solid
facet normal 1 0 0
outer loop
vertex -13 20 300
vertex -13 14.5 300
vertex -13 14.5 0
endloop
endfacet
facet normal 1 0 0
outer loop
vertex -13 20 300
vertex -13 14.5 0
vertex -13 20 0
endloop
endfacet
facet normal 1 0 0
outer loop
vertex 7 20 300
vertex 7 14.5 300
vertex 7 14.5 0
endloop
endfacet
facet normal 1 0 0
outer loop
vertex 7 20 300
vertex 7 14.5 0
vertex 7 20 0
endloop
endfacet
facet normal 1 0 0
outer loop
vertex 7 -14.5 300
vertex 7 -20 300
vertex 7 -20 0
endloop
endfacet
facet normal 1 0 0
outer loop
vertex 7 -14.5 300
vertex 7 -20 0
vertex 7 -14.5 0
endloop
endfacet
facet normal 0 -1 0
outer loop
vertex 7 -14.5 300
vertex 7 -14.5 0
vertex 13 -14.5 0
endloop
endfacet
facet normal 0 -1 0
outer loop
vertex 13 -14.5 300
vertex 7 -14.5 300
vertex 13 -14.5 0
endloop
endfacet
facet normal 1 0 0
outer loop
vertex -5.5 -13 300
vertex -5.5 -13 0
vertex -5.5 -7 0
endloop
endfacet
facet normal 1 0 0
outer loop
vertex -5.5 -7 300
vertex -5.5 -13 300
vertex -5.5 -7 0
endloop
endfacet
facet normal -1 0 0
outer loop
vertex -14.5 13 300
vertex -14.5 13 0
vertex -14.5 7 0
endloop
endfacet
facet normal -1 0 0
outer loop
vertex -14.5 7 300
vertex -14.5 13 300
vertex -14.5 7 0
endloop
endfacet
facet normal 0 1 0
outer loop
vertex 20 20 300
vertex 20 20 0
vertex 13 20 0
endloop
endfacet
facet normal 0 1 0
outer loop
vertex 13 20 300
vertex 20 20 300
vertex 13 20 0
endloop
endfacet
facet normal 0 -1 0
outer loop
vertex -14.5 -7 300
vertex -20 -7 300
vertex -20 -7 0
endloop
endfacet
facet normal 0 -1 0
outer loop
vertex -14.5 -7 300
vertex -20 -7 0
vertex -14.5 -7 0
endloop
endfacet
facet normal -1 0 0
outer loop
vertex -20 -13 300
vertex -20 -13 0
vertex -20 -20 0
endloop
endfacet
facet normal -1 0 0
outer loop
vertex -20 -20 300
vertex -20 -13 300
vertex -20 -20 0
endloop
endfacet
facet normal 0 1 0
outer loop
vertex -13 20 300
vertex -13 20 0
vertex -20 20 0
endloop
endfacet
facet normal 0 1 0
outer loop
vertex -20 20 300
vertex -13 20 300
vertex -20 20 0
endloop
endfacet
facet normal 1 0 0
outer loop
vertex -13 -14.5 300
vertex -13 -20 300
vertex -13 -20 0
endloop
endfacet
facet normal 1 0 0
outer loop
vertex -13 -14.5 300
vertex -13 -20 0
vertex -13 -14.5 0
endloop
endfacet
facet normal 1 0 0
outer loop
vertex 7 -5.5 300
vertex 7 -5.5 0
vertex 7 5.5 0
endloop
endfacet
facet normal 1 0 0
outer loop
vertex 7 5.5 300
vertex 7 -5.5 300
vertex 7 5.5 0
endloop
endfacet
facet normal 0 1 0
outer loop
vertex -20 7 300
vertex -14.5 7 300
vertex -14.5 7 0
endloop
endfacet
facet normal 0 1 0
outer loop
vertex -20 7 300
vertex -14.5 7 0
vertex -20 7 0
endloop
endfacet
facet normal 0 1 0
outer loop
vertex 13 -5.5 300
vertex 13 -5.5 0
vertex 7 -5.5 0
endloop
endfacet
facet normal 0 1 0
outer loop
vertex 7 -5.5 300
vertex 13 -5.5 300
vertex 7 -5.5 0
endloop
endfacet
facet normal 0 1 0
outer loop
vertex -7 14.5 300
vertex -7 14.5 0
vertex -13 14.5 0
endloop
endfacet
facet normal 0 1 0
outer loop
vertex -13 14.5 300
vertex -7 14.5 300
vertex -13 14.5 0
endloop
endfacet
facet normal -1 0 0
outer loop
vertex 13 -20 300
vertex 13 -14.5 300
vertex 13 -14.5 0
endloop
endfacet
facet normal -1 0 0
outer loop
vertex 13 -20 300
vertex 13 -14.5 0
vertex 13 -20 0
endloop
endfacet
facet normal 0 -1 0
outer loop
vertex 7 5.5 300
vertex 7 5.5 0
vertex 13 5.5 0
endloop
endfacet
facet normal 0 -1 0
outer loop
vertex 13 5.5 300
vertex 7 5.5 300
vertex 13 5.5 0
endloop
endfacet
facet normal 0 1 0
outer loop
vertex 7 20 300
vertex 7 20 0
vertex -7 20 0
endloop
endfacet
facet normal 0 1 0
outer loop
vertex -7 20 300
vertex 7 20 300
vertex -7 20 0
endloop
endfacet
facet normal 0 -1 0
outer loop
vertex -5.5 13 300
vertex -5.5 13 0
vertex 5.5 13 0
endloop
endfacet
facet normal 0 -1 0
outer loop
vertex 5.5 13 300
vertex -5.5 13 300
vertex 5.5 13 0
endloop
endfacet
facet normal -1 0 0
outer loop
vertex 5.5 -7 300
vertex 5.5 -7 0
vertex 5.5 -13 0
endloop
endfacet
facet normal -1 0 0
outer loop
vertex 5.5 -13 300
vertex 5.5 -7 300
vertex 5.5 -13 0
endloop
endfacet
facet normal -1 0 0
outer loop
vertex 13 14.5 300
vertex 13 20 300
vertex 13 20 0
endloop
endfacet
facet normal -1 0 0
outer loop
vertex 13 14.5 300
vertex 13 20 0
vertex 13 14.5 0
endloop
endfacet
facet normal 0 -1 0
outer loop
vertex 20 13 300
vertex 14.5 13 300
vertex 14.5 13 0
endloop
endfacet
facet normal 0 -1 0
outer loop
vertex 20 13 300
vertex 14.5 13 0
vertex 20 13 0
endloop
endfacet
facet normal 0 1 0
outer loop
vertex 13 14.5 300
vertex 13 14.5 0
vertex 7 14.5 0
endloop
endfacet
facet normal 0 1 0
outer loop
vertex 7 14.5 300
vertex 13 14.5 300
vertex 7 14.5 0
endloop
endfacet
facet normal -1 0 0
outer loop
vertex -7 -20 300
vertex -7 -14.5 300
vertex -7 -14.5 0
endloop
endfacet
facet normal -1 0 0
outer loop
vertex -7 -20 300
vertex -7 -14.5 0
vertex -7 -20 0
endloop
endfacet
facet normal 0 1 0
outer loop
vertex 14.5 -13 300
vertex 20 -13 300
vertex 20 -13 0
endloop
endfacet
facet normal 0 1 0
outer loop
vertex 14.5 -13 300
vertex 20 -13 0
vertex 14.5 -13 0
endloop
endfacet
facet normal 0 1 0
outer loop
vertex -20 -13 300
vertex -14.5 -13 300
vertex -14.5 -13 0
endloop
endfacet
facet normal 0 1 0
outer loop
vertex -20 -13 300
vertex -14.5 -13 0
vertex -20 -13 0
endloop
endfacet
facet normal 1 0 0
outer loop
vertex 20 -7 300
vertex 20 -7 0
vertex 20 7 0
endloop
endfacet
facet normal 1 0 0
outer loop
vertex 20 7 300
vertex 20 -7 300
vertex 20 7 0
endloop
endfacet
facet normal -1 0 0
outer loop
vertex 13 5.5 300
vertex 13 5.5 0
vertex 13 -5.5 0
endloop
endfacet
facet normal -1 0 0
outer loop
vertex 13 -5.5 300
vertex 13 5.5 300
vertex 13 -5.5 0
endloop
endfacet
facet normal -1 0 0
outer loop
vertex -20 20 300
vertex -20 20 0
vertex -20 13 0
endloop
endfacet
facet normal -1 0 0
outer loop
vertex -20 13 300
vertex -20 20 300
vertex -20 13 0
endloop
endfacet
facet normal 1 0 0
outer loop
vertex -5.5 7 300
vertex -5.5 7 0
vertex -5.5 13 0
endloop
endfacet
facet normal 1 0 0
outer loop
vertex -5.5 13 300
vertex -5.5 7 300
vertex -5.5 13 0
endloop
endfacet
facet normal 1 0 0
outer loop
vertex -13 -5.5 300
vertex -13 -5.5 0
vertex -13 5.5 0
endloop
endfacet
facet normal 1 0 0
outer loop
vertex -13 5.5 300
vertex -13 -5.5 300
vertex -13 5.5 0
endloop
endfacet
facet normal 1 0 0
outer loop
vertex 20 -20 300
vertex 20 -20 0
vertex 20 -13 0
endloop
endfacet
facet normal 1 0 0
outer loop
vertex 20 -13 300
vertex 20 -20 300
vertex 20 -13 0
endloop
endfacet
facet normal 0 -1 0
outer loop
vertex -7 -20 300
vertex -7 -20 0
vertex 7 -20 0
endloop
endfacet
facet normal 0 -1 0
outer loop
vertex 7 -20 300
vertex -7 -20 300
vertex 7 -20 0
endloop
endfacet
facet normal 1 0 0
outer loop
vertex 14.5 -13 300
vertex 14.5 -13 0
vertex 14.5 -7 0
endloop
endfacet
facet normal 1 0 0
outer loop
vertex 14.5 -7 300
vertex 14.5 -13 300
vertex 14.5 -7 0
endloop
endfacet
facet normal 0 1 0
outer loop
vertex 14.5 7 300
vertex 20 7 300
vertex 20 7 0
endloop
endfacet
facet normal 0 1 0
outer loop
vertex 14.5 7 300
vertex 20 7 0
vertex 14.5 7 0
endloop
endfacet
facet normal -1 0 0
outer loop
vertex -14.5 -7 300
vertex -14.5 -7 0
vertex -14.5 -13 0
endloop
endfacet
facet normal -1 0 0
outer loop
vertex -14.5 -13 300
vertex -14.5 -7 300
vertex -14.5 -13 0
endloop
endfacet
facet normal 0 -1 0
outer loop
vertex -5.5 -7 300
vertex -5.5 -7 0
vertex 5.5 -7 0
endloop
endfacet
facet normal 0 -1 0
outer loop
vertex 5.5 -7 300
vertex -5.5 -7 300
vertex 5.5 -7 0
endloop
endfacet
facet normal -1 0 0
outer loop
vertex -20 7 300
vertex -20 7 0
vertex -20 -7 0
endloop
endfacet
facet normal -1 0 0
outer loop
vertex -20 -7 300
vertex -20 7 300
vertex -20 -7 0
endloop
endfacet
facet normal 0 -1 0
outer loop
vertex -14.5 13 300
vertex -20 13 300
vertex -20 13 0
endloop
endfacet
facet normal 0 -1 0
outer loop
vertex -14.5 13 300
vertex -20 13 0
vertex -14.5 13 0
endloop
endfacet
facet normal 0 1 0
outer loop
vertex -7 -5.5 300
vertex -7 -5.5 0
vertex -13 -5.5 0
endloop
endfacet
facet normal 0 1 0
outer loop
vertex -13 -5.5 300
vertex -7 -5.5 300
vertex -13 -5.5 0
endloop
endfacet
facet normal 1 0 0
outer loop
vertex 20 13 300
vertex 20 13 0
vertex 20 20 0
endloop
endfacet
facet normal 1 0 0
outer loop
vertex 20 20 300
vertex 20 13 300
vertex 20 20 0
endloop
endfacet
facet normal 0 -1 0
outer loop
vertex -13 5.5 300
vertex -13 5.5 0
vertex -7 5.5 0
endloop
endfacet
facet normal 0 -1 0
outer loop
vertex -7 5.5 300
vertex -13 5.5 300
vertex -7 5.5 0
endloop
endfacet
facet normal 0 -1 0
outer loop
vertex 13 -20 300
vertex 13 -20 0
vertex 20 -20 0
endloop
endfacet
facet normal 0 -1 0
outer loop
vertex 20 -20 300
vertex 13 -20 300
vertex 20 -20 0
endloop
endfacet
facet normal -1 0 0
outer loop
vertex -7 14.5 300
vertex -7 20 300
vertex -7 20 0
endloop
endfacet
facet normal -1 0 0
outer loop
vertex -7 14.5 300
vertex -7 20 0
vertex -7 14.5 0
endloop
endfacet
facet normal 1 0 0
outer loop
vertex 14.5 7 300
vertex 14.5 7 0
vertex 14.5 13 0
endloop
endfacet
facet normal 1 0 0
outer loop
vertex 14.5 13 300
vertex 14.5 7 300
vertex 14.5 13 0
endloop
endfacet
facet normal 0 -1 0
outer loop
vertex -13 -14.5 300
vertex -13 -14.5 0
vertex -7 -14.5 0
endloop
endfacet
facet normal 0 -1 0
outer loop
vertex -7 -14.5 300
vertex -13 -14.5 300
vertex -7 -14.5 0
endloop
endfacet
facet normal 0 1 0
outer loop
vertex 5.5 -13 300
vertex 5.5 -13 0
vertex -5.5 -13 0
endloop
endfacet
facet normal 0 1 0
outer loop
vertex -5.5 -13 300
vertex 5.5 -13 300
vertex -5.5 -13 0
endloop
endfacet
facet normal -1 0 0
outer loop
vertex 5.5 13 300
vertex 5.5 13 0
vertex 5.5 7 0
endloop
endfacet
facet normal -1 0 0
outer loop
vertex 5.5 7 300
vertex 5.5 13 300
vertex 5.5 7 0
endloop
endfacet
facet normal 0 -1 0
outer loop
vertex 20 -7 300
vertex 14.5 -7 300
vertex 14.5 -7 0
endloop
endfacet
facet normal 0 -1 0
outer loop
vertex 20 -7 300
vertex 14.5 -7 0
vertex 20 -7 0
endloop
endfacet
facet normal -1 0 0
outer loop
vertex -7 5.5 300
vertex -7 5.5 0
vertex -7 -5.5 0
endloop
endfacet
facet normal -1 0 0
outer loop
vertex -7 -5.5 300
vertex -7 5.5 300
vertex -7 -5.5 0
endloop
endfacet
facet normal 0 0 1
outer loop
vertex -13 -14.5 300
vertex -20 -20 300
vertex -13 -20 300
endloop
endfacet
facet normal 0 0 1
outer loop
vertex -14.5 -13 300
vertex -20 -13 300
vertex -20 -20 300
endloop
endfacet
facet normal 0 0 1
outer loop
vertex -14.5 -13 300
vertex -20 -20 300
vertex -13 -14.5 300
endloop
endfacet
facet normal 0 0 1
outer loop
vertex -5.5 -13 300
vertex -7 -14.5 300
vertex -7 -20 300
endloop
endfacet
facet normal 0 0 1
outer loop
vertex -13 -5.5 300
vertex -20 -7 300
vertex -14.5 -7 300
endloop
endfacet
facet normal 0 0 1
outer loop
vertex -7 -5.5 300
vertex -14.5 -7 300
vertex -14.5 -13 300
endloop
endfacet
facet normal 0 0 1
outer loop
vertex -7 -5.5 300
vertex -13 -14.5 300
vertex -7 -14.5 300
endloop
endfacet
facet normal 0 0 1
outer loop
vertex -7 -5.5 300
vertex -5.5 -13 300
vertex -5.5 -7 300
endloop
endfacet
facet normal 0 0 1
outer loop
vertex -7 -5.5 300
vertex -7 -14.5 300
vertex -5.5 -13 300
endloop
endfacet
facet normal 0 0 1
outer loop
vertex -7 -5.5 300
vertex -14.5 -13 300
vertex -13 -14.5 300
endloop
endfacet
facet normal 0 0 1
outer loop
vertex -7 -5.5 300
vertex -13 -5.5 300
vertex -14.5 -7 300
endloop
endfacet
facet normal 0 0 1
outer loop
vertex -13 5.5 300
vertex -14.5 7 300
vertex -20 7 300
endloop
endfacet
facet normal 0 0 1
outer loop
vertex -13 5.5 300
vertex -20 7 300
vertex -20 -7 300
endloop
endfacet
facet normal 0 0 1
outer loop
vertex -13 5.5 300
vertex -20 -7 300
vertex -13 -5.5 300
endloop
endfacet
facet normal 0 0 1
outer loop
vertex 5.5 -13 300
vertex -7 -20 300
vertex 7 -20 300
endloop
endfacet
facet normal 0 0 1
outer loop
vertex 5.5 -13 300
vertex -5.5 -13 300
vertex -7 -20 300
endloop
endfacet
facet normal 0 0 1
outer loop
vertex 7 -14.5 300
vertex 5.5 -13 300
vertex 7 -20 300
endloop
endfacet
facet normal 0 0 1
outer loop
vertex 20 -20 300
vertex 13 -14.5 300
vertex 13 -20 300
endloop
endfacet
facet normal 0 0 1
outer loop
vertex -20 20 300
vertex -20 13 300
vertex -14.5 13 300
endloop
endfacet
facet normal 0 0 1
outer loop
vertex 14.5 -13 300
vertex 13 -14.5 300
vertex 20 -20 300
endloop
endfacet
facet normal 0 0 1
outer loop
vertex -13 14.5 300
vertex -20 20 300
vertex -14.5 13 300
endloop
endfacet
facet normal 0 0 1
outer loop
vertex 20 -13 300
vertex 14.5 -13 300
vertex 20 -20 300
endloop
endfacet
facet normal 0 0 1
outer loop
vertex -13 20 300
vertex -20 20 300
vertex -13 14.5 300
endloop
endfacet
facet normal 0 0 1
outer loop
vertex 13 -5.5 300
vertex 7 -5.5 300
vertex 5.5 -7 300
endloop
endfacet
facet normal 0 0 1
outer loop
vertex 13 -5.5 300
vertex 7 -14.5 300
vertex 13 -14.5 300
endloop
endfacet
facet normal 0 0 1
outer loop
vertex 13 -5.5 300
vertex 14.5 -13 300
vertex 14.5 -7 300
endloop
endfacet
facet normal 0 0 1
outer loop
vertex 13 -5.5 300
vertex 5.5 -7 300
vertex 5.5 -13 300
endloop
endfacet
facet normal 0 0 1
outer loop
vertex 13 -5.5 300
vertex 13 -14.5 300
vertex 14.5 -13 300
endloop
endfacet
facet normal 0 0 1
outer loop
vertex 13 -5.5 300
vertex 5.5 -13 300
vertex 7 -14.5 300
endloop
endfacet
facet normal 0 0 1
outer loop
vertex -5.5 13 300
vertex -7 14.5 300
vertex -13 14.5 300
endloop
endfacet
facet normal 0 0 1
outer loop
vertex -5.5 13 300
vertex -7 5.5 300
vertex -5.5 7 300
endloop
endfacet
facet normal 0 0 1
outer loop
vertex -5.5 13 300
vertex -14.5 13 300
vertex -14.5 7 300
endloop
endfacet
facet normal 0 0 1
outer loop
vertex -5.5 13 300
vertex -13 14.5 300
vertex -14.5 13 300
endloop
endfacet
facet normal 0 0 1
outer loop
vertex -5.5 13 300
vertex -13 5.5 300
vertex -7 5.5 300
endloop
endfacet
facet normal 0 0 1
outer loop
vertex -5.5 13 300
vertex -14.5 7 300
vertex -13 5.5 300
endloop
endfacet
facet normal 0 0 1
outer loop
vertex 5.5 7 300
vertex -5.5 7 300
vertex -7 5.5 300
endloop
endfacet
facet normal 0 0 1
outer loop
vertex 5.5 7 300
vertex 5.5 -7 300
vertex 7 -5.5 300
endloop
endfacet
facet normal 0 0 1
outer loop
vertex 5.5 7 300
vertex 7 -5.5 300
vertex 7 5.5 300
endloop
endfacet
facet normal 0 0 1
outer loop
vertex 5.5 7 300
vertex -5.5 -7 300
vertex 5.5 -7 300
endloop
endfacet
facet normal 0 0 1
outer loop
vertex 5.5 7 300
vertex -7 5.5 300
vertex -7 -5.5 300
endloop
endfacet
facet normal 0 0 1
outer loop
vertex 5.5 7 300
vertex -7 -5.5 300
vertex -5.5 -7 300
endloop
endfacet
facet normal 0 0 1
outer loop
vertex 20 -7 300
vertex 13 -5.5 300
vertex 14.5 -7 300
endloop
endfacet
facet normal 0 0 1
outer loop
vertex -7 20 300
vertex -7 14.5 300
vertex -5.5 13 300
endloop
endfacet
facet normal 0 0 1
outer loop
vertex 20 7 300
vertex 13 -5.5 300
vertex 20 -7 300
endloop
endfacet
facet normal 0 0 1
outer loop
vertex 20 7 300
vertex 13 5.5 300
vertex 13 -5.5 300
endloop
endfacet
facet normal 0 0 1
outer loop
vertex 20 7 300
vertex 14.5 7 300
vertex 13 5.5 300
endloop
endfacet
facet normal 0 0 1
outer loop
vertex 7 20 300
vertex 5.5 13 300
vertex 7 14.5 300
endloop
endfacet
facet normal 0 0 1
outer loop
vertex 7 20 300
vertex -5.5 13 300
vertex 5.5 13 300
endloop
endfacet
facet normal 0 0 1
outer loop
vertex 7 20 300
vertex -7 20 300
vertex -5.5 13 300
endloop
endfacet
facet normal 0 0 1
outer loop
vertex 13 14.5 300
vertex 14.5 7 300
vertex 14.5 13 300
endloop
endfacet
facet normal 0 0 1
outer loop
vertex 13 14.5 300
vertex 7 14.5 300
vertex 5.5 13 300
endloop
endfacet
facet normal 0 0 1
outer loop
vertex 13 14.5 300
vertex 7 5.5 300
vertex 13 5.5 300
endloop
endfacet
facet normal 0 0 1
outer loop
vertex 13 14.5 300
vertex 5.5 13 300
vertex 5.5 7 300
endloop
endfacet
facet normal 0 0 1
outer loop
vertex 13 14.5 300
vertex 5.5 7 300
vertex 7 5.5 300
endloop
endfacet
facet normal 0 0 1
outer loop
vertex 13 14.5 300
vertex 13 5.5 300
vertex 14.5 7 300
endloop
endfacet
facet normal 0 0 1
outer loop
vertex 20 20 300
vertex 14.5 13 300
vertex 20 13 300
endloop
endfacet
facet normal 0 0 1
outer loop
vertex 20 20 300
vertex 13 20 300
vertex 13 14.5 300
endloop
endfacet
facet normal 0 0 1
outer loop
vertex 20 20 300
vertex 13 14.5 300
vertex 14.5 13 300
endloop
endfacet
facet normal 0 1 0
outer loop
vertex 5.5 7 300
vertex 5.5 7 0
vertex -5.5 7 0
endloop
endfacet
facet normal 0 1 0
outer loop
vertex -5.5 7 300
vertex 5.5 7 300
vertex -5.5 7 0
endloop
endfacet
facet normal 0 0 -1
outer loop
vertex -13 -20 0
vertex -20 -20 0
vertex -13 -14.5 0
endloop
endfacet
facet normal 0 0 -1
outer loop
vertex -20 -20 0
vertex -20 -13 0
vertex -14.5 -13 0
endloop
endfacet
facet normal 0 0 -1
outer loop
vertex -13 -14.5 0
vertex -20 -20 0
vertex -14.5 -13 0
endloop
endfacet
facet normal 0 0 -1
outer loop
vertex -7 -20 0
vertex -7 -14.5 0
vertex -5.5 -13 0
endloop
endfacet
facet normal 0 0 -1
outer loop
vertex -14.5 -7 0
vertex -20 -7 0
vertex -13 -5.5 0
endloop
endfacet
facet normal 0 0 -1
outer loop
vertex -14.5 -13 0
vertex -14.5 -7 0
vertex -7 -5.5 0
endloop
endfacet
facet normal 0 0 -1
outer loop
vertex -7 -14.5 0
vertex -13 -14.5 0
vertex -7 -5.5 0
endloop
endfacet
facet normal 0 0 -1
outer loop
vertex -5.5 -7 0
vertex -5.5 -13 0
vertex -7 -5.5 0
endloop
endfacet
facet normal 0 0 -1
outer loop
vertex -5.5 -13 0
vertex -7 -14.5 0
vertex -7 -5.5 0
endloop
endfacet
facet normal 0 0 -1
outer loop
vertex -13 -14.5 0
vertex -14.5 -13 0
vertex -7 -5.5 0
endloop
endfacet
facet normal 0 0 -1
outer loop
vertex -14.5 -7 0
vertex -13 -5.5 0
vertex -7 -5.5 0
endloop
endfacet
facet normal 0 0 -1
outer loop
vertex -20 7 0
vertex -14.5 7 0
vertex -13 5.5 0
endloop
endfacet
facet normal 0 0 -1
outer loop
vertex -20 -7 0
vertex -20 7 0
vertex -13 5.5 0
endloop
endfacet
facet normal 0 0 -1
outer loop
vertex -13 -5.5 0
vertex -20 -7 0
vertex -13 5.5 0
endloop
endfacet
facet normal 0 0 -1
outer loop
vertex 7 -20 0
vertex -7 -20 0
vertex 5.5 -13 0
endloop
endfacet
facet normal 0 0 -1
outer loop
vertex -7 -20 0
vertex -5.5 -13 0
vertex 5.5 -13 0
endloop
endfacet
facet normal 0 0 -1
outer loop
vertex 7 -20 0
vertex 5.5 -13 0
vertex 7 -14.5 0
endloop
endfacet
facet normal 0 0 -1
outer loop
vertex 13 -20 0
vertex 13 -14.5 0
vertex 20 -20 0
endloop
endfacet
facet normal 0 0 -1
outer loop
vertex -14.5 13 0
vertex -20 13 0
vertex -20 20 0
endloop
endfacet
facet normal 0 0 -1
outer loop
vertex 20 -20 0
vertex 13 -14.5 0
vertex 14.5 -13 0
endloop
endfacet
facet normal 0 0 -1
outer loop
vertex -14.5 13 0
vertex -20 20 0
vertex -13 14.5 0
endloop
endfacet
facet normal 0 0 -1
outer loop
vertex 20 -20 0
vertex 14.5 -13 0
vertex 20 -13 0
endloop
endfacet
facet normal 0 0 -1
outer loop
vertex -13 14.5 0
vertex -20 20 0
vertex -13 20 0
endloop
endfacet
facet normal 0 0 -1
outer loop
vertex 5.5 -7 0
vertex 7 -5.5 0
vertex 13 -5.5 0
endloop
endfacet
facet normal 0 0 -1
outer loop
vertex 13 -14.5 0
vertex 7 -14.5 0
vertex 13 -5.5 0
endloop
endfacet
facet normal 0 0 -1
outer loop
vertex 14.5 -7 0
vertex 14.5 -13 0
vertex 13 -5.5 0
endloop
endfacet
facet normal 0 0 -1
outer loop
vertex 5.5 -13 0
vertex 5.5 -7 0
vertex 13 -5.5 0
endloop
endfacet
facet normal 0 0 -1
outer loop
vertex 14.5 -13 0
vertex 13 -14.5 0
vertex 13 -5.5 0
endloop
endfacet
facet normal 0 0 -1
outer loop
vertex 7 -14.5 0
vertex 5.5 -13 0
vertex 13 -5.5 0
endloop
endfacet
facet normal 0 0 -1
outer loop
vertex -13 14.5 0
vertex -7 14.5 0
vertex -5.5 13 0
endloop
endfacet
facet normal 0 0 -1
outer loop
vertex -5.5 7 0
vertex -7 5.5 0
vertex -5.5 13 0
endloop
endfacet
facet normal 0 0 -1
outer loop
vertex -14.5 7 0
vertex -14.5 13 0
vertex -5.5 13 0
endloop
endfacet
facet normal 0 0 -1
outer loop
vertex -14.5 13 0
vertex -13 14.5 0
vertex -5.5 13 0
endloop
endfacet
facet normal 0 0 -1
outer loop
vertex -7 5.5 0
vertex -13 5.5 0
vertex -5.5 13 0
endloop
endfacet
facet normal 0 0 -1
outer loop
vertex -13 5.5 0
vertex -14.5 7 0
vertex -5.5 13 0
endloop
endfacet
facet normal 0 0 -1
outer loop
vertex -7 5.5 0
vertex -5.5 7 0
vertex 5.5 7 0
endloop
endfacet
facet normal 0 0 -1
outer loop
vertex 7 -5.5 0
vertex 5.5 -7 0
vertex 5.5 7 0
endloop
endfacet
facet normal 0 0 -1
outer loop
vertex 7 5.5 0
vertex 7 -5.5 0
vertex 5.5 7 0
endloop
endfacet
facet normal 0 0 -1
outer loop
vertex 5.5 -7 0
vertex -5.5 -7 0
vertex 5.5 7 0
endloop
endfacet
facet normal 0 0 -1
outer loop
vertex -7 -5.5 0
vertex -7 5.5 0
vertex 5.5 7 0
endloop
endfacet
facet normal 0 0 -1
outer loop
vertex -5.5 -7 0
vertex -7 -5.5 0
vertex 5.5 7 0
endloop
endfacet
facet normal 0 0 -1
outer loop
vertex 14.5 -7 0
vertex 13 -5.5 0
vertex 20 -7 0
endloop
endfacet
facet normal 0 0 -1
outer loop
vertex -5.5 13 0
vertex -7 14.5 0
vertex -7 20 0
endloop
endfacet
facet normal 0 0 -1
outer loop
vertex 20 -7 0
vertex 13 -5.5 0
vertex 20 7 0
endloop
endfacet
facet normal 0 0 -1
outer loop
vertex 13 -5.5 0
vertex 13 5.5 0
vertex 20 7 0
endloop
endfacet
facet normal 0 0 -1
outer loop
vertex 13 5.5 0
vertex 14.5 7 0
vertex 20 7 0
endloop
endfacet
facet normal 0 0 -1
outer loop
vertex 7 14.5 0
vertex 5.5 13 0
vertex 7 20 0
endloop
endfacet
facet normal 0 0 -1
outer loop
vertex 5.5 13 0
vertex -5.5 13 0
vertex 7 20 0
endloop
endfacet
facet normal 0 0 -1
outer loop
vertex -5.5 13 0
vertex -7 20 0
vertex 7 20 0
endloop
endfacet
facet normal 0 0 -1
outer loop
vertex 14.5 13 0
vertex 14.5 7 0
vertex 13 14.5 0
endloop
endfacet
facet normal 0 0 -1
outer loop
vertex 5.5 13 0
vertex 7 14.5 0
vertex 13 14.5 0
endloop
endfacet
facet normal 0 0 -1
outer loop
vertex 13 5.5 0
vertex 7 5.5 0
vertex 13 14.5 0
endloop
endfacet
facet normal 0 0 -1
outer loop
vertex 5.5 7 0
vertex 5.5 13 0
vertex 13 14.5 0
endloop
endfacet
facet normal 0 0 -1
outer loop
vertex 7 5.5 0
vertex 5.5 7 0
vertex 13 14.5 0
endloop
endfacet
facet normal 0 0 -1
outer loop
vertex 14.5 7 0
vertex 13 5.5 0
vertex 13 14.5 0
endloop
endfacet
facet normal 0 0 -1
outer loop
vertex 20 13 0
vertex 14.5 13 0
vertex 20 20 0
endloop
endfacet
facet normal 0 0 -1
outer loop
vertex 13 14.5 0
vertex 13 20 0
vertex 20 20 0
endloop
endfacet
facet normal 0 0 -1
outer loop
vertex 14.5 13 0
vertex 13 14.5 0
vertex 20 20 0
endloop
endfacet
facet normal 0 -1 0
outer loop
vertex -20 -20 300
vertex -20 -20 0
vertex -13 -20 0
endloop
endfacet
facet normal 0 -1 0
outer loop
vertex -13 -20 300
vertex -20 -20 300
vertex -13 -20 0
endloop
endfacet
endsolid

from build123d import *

# Parameters (mm, degrees)
F1_DEPTH = 300


with BuildPart() as f1:
    # F0 (on Top) → F1 (new body)
    with BuildSketch(Plane.XY):
        Polygon((0, 7), (0, 0), (7, 0), (7, 5.5), (13, 5.5), (13, 0), (20, 0), (20, 7), (14.5, 7), (14.5, 13), (20, 13), (20, 20), (13, 20), (13, 14.5), (7, 14.5), (7, 20), (0, 20), (0, 13), (5.5, 13), (5.5, 7), align=None)
        Polygon((-7, 0), (0, 0), (0, 7), (-5.5, 7), (-5.5, 13), (0, 13), (0, 20), (-7, 20), (-7, 14.5), (-13, 14.5), (-13, 20), (-20, 20), (-20, 13), (-14.5, 13), (-14.5, 7), (-20, 7), (-20, 0), (-13, 0), (-13, 5.5), (-7, 5.5), align=None)
        Polygon((0, -7), (0, 0), (-7, 0), (-7, -5.5), (-13, -5.5), (-13, 0), (-20, 0), (-20, -7), (-14.5, -7), (-14.5, -13), (-20, -13), (-20, -20), (-13, -20), (-13, -14.5), (-7, -14.5), (-7, -20), (0, -20), (0, -13), (-5.5, -13), (-5.5, -7), align=None)
        Polygon((7, 0), (0, 0), (0, -7), (5.5, -7), (5.5, -13), (0, -13), (0, -20), (7, -20), (7, -14.5), (13, -14.5), (13, -20), (20, -20), (20, -13), (14.5, -13), (14.5, -7), (20, -7), (20, 0), (13, 0), (13, -5.5), (7, -5.5), align=None)
    extrude(amount=F1_DEPTH)


solid = f1.part
